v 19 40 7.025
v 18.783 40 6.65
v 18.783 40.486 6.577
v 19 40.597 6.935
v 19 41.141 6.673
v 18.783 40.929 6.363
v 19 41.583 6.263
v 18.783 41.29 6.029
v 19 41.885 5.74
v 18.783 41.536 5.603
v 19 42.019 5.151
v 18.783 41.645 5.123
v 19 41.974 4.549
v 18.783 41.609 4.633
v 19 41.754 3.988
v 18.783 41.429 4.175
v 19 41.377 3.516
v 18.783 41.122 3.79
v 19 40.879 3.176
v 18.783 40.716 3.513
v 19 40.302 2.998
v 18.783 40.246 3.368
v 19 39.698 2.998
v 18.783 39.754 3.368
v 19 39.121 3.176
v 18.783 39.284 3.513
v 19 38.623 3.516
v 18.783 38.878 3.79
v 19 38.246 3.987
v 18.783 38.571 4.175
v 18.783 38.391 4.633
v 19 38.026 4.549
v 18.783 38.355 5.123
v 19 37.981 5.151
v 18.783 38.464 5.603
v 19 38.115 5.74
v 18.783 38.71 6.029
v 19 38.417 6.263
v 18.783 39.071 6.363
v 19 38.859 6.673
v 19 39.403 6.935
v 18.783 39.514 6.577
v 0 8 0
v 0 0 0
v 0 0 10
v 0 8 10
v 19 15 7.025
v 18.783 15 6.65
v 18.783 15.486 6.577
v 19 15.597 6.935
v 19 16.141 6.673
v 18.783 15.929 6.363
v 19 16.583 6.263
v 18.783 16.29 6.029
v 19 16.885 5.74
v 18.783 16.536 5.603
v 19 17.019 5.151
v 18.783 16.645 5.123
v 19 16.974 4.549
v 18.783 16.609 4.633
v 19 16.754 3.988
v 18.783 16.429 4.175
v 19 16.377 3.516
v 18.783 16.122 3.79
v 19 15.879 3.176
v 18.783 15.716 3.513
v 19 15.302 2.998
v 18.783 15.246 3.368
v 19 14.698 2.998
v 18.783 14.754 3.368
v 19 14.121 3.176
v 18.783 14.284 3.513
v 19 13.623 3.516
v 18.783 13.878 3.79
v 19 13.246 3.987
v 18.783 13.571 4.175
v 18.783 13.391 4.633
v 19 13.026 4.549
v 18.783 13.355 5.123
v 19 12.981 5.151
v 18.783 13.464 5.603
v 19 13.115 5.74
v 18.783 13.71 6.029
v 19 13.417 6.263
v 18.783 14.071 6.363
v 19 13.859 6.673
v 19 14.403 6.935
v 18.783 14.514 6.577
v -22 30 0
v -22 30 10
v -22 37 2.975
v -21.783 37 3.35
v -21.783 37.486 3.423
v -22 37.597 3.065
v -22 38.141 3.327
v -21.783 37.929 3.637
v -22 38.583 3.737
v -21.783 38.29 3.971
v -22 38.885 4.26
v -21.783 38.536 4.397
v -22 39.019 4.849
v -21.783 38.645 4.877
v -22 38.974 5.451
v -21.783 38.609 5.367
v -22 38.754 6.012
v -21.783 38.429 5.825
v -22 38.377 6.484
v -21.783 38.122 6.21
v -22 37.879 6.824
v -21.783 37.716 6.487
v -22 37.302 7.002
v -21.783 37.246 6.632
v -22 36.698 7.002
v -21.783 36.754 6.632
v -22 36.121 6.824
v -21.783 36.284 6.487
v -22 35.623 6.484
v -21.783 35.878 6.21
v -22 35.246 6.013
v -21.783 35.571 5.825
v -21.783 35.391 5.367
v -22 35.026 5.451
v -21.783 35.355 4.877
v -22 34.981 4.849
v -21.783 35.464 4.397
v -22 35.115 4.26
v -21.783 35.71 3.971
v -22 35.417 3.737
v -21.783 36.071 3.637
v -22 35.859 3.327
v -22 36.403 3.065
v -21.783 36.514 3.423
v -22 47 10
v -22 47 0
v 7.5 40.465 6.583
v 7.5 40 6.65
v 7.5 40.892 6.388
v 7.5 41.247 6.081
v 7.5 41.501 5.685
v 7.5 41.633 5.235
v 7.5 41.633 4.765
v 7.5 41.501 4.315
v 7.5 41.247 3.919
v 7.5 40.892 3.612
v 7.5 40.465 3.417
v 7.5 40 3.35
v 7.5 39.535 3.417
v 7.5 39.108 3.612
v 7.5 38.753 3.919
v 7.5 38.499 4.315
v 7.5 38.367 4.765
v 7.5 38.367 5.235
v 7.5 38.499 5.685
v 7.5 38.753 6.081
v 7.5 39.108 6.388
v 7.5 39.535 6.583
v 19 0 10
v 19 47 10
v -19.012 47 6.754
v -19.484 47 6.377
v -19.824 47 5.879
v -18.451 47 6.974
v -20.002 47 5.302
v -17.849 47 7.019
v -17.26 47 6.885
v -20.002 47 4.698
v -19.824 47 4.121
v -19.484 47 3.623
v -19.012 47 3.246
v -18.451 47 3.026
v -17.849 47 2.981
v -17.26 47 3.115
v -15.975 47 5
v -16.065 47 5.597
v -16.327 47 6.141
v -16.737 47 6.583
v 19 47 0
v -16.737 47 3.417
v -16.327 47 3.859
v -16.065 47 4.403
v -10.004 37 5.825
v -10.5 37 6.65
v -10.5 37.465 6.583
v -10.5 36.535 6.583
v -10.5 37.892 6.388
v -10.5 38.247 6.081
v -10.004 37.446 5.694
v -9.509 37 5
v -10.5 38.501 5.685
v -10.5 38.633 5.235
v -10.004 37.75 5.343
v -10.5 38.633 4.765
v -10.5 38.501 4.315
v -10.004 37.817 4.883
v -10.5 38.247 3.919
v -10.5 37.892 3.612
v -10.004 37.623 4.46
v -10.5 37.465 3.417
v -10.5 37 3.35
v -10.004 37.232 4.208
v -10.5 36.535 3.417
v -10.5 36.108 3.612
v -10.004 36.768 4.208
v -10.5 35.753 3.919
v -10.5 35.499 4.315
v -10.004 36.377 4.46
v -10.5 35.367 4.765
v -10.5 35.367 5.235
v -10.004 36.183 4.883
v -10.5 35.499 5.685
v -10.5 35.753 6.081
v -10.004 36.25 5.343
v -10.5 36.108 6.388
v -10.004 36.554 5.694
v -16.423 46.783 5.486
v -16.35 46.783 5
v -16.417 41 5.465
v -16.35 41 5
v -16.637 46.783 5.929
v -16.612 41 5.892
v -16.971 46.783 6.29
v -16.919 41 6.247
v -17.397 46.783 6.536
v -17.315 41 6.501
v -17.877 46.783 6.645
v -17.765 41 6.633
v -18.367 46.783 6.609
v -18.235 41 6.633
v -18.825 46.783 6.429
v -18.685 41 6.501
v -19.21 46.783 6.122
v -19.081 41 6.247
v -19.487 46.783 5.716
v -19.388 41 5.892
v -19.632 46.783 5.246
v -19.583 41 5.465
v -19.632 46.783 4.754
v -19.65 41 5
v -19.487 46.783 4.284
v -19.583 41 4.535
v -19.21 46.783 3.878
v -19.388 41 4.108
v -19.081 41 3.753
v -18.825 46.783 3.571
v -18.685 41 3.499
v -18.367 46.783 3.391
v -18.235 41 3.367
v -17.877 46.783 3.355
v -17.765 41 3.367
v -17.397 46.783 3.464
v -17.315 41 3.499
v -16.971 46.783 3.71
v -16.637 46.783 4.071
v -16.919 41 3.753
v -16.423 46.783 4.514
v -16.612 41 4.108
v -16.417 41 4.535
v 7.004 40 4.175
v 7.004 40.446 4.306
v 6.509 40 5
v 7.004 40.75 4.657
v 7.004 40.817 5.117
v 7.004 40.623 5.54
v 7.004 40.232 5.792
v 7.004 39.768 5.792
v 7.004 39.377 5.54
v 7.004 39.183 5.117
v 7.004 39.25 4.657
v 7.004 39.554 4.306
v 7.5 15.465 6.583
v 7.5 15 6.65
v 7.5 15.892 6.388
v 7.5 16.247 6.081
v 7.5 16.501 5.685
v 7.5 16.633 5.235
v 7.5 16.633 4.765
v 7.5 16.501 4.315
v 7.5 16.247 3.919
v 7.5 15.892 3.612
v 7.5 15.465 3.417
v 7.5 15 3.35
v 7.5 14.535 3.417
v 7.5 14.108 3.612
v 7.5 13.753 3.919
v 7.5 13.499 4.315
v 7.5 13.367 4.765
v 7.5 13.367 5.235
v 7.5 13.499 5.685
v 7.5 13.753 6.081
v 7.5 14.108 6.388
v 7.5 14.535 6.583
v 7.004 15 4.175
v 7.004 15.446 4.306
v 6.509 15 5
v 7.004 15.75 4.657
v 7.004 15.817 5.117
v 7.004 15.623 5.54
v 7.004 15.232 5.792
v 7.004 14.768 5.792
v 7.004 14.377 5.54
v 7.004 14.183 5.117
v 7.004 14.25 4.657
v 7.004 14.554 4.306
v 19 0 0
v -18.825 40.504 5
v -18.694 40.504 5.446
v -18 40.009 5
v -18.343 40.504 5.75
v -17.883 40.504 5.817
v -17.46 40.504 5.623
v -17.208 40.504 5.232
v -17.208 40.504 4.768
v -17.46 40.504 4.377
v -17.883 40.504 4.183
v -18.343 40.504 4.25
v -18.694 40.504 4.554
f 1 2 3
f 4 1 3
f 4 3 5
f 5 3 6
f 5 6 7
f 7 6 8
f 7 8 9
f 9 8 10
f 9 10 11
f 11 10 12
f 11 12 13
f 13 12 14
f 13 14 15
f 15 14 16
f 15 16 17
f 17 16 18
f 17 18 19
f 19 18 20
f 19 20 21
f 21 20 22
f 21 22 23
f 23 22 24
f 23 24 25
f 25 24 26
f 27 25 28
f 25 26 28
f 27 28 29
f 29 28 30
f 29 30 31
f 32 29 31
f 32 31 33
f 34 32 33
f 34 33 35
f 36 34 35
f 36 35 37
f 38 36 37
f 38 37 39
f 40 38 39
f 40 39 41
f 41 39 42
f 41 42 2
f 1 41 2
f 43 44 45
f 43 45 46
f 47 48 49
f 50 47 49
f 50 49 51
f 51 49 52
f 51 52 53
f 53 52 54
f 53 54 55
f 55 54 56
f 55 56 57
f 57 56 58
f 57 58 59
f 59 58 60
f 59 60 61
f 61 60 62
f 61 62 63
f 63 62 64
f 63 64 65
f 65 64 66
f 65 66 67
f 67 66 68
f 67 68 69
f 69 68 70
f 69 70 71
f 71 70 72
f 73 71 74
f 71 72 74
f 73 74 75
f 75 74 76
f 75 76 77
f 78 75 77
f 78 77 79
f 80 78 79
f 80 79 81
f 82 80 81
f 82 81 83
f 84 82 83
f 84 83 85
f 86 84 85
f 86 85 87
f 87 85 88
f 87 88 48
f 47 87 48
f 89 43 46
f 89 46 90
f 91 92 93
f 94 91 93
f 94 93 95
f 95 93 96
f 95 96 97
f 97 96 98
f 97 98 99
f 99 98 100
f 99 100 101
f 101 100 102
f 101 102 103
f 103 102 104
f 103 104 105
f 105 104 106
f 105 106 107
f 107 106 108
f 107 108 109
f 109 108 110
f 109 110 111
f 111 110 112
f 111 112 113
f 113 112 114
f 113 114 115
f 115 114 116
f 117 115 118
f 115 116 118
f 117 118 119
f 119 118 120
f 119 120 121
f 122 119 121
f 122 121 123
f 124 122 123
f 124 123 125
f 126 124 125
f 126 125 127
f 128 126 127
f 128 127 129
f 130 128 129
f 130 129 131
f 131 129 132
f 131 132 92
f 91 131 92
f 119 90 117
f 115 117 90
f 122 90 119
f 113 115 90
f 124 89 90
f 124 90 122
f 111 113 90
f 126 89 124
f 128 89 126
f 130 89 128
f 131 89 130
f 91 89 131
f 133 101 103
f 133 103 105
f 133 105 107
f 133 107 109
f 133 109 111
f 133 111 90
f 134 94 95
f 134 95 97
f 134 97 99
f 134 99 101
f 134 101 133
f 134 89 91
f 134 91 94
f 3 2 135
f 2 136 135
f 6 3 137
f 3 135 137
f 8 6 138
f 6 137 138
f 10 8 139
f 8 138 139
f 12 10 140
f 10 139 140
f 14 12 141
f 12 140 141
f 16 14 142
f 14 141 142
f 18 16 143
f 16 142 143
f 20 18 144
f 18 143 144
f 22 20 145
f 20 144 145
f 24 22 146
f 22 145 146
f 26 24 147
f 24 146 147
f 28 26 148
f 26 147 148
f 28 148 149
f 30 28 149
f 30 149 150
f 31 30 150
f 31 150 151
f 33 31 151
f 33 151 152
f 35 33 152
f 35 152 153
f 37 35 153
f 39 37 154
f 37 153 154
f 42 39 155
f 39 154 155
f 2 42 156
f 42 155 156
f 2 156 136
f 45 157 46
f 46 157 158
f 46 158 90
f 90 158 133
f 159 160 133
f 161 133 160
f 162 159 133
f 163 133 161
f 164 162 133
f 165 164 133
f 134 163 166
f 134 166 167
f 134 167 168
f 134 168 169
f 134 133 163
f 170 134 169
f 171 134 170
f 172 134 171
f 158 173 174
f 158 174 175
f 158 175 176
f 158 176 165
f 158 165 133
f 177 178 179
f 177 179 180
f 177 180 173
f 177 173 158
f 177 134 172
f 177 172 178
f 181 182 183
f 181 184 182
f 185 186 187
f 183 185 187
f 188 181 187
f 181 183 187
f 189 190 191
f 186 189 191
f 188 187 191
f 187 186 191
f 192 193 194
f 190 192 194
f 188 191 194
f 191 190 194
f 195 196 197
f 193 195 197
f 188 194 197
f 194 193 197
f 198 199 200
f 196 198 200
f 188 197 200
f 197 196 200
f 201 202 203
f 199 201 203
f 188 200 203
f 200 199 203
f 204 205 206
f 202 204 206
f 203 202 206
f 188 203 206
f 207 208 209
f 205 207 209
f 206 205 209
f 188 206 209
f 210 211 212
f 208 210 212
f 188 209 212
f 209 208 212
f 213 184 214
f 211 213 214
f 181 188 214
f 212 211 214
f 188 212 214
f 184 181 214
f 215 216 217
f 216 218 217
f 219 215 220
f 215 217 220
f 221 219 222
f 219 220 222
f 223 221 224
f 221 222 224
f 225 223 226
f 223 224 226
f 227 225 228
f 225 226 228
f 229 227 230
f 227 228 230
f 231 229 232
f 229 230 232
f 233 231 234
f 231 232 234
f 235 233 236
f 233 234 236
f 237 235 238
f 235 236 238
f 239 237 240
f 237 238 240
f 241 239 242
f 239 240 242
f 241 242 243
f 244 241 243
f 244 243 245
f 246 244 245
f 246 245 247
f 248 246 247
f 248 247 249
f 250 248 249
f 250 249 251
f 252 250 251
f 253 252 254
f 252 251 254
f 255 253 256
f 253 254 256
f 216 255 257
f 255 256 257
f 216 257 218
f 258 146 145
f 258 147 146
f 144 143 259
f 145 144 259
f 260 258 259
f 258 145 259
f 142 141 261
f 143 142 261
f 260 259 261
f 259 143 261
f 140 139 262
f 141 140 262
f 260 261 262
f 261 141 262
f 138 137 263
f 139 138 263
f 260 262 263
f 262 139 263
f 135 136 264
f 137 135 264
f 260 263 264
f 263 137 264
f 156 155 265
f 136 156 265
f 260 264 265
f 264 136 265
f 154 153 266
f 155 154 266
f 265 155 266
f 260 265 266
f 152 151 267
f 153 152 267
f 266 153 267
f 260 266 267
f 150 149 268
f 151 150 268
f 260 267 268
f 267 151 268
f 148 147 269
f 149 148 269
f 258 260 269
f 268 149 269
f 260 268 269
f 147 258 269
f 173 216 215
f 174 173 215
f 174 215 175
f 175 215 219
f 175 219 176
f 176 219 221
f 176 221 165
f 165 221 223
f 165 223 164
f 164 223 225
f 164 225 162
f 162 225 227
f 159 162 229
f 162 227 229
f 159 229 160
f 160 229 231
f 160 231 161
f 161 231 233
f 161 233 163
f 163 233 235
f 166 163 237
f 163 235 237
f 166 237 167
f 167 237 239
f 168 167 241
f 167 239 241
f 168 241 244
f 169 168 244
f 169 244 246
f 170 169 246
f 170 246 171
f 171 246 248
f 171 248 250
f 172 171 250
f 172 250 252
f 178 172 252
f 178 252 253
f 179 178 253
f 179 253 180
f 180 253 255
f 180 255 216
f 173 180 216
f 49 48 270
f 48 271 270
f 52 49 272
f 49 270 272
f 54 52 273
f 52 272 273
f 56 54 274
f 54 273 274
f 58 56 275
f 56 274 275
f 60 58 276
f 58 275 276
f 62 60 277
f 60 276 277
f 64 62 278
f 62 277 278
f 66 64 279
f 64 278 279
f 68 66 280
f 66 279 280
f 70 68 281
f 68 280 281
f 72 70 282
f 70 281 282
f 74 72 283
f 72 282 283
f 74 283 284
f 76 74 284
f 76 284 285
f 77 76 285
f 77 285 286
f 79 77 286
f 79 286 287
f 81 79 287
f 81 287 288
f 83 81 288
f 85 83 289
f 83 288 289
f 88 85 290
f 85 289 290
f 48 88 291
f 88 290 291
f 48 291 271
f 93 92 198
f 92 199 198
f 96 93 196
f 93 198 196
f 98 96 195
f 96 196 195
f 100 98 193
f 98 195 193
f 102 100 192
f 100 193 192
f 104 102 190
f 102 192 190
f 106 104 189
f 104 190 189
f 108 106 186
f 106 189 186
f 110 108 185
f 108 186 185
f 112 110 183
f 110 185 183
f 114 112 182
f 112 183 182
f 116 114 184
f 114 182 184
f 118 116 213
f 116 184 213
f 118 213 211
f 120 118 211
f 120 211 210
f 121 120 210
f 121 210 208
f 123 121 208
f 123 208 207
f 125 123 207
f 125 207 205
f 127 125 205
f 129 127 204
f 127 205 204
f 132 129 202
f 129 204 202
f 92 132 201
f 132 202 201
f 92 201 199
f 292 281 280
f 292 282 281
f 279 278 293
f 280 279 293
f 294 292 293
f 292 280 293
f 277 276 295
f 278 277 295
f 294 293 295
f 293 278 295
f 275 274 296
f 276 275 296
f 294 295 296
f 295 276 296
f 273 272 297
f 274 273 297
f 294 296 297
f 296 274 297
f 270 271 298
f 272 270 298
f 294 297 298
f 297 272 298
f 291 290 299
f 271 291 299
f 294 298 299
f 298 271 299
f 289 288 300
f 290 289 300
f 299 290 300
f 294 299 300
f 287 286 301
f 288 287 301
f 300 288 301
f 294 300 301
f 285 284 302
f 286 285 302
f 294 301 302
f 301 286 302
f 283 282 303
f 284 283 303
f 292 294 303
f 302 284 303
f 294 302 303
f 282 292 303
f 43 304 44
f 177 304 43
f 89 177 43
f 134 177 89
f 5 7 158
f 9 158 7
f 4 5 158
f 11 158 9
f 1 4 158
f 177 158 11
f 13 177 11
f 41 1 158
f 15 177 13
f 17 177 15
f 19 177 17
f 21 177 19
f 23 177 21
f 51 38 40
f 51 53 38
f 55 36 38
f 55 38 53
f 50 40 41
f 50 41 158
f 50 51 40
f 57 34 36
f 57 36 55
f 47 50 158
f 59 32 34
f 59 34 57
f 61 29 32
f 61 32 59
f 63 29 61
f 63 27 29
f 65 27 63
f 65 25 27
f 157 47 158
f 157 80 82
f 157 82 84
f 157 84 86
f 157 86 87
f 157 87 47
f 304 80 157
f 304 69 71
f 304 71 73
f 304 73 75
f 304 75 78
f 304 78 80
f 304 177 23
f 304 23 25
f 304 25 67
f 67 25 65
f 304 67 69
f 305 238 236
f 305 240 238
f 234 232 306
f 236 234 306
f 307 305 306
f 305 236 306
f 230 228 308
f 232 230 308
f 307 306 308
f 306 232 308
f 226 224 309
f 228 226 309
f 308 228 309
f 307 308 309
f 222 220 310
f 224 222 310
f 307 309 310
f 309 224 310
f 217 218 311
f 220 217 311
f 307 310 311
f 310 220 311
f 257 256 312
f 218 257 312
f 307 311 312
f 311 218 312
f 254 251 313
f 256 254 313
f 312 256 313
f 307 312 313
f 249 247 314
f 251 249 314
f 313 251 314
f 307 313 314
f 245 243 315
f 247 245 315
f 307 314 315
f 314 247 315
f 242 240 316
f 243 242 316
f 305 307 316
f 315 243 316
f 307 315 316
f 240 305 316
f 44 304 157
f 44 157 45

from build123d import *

# Parameters (mm, degrees)
EXTRUDE_1_DEPTH             = 10
HOLE_WIZARD_M41_D           = 3.3
HOLE_WIZARD_M41_DEPTH       = 11.5
HOLE_WIZARD_M41_CSINK_D     = 4.05
HOLE_WIZARD_M41_CSINK_ANGLE = 120
HOLE_WIZARD_M41_TIP         = 0.991420021
HOLE_WIZARD_M42_D           = 3.3
HOLE_WIZARD_M42_DEPTH       = 11.5
HOLE_WIZARD_M42_CSINK_D     = 4.05
HOLE_WIZARD_M42_CSINK_ANGLE = 120
HOLE_WIZARD_M42_TIP         = 0.991420021
HOLE_WIZARD_M43_D           = 3.3
HOLE_WIZARD_M43_DEPTH       = 6
HOLE_WIZARD_M43_CSINK_D     = 4.05
HOLE_WIZARD_M43_CSINK_ANGLE = 120
HOLE_WIZARD_M43_TIP         = 0.991420021


with BuildPart() as part:
    # Эскиз1 → Бобышка-Вытянуть1 (new body)
    with BuildSketch(Plane.XY):
        Polygon((0, 0), (0, 8), (-22, 30), (-22, 47), (19, 47), (19, 0), align=None)
    extrude(amount=EXTRUDE_1_DEPTH)

    # Отверстие обработанное метчиком M41
    with Locations(Plane(origin=(19, 0, 0), x_dir=(0, 0, -1), z_dir=(1, 0, 0))):
        with Locations((-5, 40), (-5, 15)):
            CounterSinkHole(HOLE_WIZARD_M41_D / 2, HOLE_WIZARD_M41_CSINK_D / 2, depth=HOLE_WIZARD_M41_DEPTH, counter_sink_angle=HOLE_WIZARD_M41_CSINK_ANGLE)
            with Locations((0, 0, -(HOLE_WIZARD_M41_DEPTH + HOLE_WIZARD_M41_TIP / 2))):  # 118° drill point
                Cone(0, HOLE_WIZARD_M41_D / 2, HOLE_WIZARD_M41_TIP, mode=Mode.SUBTRACT)

    # Отверстие обработанное метчиком M42
    with Locations(Plane.ZY.offset(22)):
        with Locations((5, 37)):
            CounterSinkHole(HOLE_WIZARD_M42_D / 2, HOLE_WIZARD_M42_CSINK_D / 2, depth=HOLE_WIZARD_M42_DEPTH, counter_sink_angle=HOLE_WIZARD_M42_CSINK_ANGLE)
            with Locations((0, 0, -(HOLE_WIZARD_M42_DEPTH + HOLE_WIZARD_M42_TIP / 2))):  # 118° drill point
                Cone(0, HOLE_WIZARD_M42_D / 2, HOLE_WIZARD_M42_TIP, mode=Mode.SUBTRACT)

    # Отверстие обработанное метчиком M43
    with Locations(Plane(origin=(0, 47, 0), x_dir=(-1, 0, 0), z_dir=(0, 1, 0))):
        with Locations((18, 5)):
            CounterSinkHole(HOLE_WIZARD_M43_D / 2, HOLE_WIZARD_M43_CSINK_D / 2, depth=HOLE_WIZARD_M43_DEPTH, counter_sink_angle=HOLE_WIZARD_M43_CSINK_ANGLE)
            with Locations((0, 0, -(HOLE_WIZARD_M43_DEPTH + HOLE_WIZARD_M43_TIP / 2))):  # 118° drill point
                Cone(0, HOLE_WIZARD_M43_D / 2, HOLE_WIZARD_M43_TIP, mode=Mode.SUBTRACT)


solid = part.part
